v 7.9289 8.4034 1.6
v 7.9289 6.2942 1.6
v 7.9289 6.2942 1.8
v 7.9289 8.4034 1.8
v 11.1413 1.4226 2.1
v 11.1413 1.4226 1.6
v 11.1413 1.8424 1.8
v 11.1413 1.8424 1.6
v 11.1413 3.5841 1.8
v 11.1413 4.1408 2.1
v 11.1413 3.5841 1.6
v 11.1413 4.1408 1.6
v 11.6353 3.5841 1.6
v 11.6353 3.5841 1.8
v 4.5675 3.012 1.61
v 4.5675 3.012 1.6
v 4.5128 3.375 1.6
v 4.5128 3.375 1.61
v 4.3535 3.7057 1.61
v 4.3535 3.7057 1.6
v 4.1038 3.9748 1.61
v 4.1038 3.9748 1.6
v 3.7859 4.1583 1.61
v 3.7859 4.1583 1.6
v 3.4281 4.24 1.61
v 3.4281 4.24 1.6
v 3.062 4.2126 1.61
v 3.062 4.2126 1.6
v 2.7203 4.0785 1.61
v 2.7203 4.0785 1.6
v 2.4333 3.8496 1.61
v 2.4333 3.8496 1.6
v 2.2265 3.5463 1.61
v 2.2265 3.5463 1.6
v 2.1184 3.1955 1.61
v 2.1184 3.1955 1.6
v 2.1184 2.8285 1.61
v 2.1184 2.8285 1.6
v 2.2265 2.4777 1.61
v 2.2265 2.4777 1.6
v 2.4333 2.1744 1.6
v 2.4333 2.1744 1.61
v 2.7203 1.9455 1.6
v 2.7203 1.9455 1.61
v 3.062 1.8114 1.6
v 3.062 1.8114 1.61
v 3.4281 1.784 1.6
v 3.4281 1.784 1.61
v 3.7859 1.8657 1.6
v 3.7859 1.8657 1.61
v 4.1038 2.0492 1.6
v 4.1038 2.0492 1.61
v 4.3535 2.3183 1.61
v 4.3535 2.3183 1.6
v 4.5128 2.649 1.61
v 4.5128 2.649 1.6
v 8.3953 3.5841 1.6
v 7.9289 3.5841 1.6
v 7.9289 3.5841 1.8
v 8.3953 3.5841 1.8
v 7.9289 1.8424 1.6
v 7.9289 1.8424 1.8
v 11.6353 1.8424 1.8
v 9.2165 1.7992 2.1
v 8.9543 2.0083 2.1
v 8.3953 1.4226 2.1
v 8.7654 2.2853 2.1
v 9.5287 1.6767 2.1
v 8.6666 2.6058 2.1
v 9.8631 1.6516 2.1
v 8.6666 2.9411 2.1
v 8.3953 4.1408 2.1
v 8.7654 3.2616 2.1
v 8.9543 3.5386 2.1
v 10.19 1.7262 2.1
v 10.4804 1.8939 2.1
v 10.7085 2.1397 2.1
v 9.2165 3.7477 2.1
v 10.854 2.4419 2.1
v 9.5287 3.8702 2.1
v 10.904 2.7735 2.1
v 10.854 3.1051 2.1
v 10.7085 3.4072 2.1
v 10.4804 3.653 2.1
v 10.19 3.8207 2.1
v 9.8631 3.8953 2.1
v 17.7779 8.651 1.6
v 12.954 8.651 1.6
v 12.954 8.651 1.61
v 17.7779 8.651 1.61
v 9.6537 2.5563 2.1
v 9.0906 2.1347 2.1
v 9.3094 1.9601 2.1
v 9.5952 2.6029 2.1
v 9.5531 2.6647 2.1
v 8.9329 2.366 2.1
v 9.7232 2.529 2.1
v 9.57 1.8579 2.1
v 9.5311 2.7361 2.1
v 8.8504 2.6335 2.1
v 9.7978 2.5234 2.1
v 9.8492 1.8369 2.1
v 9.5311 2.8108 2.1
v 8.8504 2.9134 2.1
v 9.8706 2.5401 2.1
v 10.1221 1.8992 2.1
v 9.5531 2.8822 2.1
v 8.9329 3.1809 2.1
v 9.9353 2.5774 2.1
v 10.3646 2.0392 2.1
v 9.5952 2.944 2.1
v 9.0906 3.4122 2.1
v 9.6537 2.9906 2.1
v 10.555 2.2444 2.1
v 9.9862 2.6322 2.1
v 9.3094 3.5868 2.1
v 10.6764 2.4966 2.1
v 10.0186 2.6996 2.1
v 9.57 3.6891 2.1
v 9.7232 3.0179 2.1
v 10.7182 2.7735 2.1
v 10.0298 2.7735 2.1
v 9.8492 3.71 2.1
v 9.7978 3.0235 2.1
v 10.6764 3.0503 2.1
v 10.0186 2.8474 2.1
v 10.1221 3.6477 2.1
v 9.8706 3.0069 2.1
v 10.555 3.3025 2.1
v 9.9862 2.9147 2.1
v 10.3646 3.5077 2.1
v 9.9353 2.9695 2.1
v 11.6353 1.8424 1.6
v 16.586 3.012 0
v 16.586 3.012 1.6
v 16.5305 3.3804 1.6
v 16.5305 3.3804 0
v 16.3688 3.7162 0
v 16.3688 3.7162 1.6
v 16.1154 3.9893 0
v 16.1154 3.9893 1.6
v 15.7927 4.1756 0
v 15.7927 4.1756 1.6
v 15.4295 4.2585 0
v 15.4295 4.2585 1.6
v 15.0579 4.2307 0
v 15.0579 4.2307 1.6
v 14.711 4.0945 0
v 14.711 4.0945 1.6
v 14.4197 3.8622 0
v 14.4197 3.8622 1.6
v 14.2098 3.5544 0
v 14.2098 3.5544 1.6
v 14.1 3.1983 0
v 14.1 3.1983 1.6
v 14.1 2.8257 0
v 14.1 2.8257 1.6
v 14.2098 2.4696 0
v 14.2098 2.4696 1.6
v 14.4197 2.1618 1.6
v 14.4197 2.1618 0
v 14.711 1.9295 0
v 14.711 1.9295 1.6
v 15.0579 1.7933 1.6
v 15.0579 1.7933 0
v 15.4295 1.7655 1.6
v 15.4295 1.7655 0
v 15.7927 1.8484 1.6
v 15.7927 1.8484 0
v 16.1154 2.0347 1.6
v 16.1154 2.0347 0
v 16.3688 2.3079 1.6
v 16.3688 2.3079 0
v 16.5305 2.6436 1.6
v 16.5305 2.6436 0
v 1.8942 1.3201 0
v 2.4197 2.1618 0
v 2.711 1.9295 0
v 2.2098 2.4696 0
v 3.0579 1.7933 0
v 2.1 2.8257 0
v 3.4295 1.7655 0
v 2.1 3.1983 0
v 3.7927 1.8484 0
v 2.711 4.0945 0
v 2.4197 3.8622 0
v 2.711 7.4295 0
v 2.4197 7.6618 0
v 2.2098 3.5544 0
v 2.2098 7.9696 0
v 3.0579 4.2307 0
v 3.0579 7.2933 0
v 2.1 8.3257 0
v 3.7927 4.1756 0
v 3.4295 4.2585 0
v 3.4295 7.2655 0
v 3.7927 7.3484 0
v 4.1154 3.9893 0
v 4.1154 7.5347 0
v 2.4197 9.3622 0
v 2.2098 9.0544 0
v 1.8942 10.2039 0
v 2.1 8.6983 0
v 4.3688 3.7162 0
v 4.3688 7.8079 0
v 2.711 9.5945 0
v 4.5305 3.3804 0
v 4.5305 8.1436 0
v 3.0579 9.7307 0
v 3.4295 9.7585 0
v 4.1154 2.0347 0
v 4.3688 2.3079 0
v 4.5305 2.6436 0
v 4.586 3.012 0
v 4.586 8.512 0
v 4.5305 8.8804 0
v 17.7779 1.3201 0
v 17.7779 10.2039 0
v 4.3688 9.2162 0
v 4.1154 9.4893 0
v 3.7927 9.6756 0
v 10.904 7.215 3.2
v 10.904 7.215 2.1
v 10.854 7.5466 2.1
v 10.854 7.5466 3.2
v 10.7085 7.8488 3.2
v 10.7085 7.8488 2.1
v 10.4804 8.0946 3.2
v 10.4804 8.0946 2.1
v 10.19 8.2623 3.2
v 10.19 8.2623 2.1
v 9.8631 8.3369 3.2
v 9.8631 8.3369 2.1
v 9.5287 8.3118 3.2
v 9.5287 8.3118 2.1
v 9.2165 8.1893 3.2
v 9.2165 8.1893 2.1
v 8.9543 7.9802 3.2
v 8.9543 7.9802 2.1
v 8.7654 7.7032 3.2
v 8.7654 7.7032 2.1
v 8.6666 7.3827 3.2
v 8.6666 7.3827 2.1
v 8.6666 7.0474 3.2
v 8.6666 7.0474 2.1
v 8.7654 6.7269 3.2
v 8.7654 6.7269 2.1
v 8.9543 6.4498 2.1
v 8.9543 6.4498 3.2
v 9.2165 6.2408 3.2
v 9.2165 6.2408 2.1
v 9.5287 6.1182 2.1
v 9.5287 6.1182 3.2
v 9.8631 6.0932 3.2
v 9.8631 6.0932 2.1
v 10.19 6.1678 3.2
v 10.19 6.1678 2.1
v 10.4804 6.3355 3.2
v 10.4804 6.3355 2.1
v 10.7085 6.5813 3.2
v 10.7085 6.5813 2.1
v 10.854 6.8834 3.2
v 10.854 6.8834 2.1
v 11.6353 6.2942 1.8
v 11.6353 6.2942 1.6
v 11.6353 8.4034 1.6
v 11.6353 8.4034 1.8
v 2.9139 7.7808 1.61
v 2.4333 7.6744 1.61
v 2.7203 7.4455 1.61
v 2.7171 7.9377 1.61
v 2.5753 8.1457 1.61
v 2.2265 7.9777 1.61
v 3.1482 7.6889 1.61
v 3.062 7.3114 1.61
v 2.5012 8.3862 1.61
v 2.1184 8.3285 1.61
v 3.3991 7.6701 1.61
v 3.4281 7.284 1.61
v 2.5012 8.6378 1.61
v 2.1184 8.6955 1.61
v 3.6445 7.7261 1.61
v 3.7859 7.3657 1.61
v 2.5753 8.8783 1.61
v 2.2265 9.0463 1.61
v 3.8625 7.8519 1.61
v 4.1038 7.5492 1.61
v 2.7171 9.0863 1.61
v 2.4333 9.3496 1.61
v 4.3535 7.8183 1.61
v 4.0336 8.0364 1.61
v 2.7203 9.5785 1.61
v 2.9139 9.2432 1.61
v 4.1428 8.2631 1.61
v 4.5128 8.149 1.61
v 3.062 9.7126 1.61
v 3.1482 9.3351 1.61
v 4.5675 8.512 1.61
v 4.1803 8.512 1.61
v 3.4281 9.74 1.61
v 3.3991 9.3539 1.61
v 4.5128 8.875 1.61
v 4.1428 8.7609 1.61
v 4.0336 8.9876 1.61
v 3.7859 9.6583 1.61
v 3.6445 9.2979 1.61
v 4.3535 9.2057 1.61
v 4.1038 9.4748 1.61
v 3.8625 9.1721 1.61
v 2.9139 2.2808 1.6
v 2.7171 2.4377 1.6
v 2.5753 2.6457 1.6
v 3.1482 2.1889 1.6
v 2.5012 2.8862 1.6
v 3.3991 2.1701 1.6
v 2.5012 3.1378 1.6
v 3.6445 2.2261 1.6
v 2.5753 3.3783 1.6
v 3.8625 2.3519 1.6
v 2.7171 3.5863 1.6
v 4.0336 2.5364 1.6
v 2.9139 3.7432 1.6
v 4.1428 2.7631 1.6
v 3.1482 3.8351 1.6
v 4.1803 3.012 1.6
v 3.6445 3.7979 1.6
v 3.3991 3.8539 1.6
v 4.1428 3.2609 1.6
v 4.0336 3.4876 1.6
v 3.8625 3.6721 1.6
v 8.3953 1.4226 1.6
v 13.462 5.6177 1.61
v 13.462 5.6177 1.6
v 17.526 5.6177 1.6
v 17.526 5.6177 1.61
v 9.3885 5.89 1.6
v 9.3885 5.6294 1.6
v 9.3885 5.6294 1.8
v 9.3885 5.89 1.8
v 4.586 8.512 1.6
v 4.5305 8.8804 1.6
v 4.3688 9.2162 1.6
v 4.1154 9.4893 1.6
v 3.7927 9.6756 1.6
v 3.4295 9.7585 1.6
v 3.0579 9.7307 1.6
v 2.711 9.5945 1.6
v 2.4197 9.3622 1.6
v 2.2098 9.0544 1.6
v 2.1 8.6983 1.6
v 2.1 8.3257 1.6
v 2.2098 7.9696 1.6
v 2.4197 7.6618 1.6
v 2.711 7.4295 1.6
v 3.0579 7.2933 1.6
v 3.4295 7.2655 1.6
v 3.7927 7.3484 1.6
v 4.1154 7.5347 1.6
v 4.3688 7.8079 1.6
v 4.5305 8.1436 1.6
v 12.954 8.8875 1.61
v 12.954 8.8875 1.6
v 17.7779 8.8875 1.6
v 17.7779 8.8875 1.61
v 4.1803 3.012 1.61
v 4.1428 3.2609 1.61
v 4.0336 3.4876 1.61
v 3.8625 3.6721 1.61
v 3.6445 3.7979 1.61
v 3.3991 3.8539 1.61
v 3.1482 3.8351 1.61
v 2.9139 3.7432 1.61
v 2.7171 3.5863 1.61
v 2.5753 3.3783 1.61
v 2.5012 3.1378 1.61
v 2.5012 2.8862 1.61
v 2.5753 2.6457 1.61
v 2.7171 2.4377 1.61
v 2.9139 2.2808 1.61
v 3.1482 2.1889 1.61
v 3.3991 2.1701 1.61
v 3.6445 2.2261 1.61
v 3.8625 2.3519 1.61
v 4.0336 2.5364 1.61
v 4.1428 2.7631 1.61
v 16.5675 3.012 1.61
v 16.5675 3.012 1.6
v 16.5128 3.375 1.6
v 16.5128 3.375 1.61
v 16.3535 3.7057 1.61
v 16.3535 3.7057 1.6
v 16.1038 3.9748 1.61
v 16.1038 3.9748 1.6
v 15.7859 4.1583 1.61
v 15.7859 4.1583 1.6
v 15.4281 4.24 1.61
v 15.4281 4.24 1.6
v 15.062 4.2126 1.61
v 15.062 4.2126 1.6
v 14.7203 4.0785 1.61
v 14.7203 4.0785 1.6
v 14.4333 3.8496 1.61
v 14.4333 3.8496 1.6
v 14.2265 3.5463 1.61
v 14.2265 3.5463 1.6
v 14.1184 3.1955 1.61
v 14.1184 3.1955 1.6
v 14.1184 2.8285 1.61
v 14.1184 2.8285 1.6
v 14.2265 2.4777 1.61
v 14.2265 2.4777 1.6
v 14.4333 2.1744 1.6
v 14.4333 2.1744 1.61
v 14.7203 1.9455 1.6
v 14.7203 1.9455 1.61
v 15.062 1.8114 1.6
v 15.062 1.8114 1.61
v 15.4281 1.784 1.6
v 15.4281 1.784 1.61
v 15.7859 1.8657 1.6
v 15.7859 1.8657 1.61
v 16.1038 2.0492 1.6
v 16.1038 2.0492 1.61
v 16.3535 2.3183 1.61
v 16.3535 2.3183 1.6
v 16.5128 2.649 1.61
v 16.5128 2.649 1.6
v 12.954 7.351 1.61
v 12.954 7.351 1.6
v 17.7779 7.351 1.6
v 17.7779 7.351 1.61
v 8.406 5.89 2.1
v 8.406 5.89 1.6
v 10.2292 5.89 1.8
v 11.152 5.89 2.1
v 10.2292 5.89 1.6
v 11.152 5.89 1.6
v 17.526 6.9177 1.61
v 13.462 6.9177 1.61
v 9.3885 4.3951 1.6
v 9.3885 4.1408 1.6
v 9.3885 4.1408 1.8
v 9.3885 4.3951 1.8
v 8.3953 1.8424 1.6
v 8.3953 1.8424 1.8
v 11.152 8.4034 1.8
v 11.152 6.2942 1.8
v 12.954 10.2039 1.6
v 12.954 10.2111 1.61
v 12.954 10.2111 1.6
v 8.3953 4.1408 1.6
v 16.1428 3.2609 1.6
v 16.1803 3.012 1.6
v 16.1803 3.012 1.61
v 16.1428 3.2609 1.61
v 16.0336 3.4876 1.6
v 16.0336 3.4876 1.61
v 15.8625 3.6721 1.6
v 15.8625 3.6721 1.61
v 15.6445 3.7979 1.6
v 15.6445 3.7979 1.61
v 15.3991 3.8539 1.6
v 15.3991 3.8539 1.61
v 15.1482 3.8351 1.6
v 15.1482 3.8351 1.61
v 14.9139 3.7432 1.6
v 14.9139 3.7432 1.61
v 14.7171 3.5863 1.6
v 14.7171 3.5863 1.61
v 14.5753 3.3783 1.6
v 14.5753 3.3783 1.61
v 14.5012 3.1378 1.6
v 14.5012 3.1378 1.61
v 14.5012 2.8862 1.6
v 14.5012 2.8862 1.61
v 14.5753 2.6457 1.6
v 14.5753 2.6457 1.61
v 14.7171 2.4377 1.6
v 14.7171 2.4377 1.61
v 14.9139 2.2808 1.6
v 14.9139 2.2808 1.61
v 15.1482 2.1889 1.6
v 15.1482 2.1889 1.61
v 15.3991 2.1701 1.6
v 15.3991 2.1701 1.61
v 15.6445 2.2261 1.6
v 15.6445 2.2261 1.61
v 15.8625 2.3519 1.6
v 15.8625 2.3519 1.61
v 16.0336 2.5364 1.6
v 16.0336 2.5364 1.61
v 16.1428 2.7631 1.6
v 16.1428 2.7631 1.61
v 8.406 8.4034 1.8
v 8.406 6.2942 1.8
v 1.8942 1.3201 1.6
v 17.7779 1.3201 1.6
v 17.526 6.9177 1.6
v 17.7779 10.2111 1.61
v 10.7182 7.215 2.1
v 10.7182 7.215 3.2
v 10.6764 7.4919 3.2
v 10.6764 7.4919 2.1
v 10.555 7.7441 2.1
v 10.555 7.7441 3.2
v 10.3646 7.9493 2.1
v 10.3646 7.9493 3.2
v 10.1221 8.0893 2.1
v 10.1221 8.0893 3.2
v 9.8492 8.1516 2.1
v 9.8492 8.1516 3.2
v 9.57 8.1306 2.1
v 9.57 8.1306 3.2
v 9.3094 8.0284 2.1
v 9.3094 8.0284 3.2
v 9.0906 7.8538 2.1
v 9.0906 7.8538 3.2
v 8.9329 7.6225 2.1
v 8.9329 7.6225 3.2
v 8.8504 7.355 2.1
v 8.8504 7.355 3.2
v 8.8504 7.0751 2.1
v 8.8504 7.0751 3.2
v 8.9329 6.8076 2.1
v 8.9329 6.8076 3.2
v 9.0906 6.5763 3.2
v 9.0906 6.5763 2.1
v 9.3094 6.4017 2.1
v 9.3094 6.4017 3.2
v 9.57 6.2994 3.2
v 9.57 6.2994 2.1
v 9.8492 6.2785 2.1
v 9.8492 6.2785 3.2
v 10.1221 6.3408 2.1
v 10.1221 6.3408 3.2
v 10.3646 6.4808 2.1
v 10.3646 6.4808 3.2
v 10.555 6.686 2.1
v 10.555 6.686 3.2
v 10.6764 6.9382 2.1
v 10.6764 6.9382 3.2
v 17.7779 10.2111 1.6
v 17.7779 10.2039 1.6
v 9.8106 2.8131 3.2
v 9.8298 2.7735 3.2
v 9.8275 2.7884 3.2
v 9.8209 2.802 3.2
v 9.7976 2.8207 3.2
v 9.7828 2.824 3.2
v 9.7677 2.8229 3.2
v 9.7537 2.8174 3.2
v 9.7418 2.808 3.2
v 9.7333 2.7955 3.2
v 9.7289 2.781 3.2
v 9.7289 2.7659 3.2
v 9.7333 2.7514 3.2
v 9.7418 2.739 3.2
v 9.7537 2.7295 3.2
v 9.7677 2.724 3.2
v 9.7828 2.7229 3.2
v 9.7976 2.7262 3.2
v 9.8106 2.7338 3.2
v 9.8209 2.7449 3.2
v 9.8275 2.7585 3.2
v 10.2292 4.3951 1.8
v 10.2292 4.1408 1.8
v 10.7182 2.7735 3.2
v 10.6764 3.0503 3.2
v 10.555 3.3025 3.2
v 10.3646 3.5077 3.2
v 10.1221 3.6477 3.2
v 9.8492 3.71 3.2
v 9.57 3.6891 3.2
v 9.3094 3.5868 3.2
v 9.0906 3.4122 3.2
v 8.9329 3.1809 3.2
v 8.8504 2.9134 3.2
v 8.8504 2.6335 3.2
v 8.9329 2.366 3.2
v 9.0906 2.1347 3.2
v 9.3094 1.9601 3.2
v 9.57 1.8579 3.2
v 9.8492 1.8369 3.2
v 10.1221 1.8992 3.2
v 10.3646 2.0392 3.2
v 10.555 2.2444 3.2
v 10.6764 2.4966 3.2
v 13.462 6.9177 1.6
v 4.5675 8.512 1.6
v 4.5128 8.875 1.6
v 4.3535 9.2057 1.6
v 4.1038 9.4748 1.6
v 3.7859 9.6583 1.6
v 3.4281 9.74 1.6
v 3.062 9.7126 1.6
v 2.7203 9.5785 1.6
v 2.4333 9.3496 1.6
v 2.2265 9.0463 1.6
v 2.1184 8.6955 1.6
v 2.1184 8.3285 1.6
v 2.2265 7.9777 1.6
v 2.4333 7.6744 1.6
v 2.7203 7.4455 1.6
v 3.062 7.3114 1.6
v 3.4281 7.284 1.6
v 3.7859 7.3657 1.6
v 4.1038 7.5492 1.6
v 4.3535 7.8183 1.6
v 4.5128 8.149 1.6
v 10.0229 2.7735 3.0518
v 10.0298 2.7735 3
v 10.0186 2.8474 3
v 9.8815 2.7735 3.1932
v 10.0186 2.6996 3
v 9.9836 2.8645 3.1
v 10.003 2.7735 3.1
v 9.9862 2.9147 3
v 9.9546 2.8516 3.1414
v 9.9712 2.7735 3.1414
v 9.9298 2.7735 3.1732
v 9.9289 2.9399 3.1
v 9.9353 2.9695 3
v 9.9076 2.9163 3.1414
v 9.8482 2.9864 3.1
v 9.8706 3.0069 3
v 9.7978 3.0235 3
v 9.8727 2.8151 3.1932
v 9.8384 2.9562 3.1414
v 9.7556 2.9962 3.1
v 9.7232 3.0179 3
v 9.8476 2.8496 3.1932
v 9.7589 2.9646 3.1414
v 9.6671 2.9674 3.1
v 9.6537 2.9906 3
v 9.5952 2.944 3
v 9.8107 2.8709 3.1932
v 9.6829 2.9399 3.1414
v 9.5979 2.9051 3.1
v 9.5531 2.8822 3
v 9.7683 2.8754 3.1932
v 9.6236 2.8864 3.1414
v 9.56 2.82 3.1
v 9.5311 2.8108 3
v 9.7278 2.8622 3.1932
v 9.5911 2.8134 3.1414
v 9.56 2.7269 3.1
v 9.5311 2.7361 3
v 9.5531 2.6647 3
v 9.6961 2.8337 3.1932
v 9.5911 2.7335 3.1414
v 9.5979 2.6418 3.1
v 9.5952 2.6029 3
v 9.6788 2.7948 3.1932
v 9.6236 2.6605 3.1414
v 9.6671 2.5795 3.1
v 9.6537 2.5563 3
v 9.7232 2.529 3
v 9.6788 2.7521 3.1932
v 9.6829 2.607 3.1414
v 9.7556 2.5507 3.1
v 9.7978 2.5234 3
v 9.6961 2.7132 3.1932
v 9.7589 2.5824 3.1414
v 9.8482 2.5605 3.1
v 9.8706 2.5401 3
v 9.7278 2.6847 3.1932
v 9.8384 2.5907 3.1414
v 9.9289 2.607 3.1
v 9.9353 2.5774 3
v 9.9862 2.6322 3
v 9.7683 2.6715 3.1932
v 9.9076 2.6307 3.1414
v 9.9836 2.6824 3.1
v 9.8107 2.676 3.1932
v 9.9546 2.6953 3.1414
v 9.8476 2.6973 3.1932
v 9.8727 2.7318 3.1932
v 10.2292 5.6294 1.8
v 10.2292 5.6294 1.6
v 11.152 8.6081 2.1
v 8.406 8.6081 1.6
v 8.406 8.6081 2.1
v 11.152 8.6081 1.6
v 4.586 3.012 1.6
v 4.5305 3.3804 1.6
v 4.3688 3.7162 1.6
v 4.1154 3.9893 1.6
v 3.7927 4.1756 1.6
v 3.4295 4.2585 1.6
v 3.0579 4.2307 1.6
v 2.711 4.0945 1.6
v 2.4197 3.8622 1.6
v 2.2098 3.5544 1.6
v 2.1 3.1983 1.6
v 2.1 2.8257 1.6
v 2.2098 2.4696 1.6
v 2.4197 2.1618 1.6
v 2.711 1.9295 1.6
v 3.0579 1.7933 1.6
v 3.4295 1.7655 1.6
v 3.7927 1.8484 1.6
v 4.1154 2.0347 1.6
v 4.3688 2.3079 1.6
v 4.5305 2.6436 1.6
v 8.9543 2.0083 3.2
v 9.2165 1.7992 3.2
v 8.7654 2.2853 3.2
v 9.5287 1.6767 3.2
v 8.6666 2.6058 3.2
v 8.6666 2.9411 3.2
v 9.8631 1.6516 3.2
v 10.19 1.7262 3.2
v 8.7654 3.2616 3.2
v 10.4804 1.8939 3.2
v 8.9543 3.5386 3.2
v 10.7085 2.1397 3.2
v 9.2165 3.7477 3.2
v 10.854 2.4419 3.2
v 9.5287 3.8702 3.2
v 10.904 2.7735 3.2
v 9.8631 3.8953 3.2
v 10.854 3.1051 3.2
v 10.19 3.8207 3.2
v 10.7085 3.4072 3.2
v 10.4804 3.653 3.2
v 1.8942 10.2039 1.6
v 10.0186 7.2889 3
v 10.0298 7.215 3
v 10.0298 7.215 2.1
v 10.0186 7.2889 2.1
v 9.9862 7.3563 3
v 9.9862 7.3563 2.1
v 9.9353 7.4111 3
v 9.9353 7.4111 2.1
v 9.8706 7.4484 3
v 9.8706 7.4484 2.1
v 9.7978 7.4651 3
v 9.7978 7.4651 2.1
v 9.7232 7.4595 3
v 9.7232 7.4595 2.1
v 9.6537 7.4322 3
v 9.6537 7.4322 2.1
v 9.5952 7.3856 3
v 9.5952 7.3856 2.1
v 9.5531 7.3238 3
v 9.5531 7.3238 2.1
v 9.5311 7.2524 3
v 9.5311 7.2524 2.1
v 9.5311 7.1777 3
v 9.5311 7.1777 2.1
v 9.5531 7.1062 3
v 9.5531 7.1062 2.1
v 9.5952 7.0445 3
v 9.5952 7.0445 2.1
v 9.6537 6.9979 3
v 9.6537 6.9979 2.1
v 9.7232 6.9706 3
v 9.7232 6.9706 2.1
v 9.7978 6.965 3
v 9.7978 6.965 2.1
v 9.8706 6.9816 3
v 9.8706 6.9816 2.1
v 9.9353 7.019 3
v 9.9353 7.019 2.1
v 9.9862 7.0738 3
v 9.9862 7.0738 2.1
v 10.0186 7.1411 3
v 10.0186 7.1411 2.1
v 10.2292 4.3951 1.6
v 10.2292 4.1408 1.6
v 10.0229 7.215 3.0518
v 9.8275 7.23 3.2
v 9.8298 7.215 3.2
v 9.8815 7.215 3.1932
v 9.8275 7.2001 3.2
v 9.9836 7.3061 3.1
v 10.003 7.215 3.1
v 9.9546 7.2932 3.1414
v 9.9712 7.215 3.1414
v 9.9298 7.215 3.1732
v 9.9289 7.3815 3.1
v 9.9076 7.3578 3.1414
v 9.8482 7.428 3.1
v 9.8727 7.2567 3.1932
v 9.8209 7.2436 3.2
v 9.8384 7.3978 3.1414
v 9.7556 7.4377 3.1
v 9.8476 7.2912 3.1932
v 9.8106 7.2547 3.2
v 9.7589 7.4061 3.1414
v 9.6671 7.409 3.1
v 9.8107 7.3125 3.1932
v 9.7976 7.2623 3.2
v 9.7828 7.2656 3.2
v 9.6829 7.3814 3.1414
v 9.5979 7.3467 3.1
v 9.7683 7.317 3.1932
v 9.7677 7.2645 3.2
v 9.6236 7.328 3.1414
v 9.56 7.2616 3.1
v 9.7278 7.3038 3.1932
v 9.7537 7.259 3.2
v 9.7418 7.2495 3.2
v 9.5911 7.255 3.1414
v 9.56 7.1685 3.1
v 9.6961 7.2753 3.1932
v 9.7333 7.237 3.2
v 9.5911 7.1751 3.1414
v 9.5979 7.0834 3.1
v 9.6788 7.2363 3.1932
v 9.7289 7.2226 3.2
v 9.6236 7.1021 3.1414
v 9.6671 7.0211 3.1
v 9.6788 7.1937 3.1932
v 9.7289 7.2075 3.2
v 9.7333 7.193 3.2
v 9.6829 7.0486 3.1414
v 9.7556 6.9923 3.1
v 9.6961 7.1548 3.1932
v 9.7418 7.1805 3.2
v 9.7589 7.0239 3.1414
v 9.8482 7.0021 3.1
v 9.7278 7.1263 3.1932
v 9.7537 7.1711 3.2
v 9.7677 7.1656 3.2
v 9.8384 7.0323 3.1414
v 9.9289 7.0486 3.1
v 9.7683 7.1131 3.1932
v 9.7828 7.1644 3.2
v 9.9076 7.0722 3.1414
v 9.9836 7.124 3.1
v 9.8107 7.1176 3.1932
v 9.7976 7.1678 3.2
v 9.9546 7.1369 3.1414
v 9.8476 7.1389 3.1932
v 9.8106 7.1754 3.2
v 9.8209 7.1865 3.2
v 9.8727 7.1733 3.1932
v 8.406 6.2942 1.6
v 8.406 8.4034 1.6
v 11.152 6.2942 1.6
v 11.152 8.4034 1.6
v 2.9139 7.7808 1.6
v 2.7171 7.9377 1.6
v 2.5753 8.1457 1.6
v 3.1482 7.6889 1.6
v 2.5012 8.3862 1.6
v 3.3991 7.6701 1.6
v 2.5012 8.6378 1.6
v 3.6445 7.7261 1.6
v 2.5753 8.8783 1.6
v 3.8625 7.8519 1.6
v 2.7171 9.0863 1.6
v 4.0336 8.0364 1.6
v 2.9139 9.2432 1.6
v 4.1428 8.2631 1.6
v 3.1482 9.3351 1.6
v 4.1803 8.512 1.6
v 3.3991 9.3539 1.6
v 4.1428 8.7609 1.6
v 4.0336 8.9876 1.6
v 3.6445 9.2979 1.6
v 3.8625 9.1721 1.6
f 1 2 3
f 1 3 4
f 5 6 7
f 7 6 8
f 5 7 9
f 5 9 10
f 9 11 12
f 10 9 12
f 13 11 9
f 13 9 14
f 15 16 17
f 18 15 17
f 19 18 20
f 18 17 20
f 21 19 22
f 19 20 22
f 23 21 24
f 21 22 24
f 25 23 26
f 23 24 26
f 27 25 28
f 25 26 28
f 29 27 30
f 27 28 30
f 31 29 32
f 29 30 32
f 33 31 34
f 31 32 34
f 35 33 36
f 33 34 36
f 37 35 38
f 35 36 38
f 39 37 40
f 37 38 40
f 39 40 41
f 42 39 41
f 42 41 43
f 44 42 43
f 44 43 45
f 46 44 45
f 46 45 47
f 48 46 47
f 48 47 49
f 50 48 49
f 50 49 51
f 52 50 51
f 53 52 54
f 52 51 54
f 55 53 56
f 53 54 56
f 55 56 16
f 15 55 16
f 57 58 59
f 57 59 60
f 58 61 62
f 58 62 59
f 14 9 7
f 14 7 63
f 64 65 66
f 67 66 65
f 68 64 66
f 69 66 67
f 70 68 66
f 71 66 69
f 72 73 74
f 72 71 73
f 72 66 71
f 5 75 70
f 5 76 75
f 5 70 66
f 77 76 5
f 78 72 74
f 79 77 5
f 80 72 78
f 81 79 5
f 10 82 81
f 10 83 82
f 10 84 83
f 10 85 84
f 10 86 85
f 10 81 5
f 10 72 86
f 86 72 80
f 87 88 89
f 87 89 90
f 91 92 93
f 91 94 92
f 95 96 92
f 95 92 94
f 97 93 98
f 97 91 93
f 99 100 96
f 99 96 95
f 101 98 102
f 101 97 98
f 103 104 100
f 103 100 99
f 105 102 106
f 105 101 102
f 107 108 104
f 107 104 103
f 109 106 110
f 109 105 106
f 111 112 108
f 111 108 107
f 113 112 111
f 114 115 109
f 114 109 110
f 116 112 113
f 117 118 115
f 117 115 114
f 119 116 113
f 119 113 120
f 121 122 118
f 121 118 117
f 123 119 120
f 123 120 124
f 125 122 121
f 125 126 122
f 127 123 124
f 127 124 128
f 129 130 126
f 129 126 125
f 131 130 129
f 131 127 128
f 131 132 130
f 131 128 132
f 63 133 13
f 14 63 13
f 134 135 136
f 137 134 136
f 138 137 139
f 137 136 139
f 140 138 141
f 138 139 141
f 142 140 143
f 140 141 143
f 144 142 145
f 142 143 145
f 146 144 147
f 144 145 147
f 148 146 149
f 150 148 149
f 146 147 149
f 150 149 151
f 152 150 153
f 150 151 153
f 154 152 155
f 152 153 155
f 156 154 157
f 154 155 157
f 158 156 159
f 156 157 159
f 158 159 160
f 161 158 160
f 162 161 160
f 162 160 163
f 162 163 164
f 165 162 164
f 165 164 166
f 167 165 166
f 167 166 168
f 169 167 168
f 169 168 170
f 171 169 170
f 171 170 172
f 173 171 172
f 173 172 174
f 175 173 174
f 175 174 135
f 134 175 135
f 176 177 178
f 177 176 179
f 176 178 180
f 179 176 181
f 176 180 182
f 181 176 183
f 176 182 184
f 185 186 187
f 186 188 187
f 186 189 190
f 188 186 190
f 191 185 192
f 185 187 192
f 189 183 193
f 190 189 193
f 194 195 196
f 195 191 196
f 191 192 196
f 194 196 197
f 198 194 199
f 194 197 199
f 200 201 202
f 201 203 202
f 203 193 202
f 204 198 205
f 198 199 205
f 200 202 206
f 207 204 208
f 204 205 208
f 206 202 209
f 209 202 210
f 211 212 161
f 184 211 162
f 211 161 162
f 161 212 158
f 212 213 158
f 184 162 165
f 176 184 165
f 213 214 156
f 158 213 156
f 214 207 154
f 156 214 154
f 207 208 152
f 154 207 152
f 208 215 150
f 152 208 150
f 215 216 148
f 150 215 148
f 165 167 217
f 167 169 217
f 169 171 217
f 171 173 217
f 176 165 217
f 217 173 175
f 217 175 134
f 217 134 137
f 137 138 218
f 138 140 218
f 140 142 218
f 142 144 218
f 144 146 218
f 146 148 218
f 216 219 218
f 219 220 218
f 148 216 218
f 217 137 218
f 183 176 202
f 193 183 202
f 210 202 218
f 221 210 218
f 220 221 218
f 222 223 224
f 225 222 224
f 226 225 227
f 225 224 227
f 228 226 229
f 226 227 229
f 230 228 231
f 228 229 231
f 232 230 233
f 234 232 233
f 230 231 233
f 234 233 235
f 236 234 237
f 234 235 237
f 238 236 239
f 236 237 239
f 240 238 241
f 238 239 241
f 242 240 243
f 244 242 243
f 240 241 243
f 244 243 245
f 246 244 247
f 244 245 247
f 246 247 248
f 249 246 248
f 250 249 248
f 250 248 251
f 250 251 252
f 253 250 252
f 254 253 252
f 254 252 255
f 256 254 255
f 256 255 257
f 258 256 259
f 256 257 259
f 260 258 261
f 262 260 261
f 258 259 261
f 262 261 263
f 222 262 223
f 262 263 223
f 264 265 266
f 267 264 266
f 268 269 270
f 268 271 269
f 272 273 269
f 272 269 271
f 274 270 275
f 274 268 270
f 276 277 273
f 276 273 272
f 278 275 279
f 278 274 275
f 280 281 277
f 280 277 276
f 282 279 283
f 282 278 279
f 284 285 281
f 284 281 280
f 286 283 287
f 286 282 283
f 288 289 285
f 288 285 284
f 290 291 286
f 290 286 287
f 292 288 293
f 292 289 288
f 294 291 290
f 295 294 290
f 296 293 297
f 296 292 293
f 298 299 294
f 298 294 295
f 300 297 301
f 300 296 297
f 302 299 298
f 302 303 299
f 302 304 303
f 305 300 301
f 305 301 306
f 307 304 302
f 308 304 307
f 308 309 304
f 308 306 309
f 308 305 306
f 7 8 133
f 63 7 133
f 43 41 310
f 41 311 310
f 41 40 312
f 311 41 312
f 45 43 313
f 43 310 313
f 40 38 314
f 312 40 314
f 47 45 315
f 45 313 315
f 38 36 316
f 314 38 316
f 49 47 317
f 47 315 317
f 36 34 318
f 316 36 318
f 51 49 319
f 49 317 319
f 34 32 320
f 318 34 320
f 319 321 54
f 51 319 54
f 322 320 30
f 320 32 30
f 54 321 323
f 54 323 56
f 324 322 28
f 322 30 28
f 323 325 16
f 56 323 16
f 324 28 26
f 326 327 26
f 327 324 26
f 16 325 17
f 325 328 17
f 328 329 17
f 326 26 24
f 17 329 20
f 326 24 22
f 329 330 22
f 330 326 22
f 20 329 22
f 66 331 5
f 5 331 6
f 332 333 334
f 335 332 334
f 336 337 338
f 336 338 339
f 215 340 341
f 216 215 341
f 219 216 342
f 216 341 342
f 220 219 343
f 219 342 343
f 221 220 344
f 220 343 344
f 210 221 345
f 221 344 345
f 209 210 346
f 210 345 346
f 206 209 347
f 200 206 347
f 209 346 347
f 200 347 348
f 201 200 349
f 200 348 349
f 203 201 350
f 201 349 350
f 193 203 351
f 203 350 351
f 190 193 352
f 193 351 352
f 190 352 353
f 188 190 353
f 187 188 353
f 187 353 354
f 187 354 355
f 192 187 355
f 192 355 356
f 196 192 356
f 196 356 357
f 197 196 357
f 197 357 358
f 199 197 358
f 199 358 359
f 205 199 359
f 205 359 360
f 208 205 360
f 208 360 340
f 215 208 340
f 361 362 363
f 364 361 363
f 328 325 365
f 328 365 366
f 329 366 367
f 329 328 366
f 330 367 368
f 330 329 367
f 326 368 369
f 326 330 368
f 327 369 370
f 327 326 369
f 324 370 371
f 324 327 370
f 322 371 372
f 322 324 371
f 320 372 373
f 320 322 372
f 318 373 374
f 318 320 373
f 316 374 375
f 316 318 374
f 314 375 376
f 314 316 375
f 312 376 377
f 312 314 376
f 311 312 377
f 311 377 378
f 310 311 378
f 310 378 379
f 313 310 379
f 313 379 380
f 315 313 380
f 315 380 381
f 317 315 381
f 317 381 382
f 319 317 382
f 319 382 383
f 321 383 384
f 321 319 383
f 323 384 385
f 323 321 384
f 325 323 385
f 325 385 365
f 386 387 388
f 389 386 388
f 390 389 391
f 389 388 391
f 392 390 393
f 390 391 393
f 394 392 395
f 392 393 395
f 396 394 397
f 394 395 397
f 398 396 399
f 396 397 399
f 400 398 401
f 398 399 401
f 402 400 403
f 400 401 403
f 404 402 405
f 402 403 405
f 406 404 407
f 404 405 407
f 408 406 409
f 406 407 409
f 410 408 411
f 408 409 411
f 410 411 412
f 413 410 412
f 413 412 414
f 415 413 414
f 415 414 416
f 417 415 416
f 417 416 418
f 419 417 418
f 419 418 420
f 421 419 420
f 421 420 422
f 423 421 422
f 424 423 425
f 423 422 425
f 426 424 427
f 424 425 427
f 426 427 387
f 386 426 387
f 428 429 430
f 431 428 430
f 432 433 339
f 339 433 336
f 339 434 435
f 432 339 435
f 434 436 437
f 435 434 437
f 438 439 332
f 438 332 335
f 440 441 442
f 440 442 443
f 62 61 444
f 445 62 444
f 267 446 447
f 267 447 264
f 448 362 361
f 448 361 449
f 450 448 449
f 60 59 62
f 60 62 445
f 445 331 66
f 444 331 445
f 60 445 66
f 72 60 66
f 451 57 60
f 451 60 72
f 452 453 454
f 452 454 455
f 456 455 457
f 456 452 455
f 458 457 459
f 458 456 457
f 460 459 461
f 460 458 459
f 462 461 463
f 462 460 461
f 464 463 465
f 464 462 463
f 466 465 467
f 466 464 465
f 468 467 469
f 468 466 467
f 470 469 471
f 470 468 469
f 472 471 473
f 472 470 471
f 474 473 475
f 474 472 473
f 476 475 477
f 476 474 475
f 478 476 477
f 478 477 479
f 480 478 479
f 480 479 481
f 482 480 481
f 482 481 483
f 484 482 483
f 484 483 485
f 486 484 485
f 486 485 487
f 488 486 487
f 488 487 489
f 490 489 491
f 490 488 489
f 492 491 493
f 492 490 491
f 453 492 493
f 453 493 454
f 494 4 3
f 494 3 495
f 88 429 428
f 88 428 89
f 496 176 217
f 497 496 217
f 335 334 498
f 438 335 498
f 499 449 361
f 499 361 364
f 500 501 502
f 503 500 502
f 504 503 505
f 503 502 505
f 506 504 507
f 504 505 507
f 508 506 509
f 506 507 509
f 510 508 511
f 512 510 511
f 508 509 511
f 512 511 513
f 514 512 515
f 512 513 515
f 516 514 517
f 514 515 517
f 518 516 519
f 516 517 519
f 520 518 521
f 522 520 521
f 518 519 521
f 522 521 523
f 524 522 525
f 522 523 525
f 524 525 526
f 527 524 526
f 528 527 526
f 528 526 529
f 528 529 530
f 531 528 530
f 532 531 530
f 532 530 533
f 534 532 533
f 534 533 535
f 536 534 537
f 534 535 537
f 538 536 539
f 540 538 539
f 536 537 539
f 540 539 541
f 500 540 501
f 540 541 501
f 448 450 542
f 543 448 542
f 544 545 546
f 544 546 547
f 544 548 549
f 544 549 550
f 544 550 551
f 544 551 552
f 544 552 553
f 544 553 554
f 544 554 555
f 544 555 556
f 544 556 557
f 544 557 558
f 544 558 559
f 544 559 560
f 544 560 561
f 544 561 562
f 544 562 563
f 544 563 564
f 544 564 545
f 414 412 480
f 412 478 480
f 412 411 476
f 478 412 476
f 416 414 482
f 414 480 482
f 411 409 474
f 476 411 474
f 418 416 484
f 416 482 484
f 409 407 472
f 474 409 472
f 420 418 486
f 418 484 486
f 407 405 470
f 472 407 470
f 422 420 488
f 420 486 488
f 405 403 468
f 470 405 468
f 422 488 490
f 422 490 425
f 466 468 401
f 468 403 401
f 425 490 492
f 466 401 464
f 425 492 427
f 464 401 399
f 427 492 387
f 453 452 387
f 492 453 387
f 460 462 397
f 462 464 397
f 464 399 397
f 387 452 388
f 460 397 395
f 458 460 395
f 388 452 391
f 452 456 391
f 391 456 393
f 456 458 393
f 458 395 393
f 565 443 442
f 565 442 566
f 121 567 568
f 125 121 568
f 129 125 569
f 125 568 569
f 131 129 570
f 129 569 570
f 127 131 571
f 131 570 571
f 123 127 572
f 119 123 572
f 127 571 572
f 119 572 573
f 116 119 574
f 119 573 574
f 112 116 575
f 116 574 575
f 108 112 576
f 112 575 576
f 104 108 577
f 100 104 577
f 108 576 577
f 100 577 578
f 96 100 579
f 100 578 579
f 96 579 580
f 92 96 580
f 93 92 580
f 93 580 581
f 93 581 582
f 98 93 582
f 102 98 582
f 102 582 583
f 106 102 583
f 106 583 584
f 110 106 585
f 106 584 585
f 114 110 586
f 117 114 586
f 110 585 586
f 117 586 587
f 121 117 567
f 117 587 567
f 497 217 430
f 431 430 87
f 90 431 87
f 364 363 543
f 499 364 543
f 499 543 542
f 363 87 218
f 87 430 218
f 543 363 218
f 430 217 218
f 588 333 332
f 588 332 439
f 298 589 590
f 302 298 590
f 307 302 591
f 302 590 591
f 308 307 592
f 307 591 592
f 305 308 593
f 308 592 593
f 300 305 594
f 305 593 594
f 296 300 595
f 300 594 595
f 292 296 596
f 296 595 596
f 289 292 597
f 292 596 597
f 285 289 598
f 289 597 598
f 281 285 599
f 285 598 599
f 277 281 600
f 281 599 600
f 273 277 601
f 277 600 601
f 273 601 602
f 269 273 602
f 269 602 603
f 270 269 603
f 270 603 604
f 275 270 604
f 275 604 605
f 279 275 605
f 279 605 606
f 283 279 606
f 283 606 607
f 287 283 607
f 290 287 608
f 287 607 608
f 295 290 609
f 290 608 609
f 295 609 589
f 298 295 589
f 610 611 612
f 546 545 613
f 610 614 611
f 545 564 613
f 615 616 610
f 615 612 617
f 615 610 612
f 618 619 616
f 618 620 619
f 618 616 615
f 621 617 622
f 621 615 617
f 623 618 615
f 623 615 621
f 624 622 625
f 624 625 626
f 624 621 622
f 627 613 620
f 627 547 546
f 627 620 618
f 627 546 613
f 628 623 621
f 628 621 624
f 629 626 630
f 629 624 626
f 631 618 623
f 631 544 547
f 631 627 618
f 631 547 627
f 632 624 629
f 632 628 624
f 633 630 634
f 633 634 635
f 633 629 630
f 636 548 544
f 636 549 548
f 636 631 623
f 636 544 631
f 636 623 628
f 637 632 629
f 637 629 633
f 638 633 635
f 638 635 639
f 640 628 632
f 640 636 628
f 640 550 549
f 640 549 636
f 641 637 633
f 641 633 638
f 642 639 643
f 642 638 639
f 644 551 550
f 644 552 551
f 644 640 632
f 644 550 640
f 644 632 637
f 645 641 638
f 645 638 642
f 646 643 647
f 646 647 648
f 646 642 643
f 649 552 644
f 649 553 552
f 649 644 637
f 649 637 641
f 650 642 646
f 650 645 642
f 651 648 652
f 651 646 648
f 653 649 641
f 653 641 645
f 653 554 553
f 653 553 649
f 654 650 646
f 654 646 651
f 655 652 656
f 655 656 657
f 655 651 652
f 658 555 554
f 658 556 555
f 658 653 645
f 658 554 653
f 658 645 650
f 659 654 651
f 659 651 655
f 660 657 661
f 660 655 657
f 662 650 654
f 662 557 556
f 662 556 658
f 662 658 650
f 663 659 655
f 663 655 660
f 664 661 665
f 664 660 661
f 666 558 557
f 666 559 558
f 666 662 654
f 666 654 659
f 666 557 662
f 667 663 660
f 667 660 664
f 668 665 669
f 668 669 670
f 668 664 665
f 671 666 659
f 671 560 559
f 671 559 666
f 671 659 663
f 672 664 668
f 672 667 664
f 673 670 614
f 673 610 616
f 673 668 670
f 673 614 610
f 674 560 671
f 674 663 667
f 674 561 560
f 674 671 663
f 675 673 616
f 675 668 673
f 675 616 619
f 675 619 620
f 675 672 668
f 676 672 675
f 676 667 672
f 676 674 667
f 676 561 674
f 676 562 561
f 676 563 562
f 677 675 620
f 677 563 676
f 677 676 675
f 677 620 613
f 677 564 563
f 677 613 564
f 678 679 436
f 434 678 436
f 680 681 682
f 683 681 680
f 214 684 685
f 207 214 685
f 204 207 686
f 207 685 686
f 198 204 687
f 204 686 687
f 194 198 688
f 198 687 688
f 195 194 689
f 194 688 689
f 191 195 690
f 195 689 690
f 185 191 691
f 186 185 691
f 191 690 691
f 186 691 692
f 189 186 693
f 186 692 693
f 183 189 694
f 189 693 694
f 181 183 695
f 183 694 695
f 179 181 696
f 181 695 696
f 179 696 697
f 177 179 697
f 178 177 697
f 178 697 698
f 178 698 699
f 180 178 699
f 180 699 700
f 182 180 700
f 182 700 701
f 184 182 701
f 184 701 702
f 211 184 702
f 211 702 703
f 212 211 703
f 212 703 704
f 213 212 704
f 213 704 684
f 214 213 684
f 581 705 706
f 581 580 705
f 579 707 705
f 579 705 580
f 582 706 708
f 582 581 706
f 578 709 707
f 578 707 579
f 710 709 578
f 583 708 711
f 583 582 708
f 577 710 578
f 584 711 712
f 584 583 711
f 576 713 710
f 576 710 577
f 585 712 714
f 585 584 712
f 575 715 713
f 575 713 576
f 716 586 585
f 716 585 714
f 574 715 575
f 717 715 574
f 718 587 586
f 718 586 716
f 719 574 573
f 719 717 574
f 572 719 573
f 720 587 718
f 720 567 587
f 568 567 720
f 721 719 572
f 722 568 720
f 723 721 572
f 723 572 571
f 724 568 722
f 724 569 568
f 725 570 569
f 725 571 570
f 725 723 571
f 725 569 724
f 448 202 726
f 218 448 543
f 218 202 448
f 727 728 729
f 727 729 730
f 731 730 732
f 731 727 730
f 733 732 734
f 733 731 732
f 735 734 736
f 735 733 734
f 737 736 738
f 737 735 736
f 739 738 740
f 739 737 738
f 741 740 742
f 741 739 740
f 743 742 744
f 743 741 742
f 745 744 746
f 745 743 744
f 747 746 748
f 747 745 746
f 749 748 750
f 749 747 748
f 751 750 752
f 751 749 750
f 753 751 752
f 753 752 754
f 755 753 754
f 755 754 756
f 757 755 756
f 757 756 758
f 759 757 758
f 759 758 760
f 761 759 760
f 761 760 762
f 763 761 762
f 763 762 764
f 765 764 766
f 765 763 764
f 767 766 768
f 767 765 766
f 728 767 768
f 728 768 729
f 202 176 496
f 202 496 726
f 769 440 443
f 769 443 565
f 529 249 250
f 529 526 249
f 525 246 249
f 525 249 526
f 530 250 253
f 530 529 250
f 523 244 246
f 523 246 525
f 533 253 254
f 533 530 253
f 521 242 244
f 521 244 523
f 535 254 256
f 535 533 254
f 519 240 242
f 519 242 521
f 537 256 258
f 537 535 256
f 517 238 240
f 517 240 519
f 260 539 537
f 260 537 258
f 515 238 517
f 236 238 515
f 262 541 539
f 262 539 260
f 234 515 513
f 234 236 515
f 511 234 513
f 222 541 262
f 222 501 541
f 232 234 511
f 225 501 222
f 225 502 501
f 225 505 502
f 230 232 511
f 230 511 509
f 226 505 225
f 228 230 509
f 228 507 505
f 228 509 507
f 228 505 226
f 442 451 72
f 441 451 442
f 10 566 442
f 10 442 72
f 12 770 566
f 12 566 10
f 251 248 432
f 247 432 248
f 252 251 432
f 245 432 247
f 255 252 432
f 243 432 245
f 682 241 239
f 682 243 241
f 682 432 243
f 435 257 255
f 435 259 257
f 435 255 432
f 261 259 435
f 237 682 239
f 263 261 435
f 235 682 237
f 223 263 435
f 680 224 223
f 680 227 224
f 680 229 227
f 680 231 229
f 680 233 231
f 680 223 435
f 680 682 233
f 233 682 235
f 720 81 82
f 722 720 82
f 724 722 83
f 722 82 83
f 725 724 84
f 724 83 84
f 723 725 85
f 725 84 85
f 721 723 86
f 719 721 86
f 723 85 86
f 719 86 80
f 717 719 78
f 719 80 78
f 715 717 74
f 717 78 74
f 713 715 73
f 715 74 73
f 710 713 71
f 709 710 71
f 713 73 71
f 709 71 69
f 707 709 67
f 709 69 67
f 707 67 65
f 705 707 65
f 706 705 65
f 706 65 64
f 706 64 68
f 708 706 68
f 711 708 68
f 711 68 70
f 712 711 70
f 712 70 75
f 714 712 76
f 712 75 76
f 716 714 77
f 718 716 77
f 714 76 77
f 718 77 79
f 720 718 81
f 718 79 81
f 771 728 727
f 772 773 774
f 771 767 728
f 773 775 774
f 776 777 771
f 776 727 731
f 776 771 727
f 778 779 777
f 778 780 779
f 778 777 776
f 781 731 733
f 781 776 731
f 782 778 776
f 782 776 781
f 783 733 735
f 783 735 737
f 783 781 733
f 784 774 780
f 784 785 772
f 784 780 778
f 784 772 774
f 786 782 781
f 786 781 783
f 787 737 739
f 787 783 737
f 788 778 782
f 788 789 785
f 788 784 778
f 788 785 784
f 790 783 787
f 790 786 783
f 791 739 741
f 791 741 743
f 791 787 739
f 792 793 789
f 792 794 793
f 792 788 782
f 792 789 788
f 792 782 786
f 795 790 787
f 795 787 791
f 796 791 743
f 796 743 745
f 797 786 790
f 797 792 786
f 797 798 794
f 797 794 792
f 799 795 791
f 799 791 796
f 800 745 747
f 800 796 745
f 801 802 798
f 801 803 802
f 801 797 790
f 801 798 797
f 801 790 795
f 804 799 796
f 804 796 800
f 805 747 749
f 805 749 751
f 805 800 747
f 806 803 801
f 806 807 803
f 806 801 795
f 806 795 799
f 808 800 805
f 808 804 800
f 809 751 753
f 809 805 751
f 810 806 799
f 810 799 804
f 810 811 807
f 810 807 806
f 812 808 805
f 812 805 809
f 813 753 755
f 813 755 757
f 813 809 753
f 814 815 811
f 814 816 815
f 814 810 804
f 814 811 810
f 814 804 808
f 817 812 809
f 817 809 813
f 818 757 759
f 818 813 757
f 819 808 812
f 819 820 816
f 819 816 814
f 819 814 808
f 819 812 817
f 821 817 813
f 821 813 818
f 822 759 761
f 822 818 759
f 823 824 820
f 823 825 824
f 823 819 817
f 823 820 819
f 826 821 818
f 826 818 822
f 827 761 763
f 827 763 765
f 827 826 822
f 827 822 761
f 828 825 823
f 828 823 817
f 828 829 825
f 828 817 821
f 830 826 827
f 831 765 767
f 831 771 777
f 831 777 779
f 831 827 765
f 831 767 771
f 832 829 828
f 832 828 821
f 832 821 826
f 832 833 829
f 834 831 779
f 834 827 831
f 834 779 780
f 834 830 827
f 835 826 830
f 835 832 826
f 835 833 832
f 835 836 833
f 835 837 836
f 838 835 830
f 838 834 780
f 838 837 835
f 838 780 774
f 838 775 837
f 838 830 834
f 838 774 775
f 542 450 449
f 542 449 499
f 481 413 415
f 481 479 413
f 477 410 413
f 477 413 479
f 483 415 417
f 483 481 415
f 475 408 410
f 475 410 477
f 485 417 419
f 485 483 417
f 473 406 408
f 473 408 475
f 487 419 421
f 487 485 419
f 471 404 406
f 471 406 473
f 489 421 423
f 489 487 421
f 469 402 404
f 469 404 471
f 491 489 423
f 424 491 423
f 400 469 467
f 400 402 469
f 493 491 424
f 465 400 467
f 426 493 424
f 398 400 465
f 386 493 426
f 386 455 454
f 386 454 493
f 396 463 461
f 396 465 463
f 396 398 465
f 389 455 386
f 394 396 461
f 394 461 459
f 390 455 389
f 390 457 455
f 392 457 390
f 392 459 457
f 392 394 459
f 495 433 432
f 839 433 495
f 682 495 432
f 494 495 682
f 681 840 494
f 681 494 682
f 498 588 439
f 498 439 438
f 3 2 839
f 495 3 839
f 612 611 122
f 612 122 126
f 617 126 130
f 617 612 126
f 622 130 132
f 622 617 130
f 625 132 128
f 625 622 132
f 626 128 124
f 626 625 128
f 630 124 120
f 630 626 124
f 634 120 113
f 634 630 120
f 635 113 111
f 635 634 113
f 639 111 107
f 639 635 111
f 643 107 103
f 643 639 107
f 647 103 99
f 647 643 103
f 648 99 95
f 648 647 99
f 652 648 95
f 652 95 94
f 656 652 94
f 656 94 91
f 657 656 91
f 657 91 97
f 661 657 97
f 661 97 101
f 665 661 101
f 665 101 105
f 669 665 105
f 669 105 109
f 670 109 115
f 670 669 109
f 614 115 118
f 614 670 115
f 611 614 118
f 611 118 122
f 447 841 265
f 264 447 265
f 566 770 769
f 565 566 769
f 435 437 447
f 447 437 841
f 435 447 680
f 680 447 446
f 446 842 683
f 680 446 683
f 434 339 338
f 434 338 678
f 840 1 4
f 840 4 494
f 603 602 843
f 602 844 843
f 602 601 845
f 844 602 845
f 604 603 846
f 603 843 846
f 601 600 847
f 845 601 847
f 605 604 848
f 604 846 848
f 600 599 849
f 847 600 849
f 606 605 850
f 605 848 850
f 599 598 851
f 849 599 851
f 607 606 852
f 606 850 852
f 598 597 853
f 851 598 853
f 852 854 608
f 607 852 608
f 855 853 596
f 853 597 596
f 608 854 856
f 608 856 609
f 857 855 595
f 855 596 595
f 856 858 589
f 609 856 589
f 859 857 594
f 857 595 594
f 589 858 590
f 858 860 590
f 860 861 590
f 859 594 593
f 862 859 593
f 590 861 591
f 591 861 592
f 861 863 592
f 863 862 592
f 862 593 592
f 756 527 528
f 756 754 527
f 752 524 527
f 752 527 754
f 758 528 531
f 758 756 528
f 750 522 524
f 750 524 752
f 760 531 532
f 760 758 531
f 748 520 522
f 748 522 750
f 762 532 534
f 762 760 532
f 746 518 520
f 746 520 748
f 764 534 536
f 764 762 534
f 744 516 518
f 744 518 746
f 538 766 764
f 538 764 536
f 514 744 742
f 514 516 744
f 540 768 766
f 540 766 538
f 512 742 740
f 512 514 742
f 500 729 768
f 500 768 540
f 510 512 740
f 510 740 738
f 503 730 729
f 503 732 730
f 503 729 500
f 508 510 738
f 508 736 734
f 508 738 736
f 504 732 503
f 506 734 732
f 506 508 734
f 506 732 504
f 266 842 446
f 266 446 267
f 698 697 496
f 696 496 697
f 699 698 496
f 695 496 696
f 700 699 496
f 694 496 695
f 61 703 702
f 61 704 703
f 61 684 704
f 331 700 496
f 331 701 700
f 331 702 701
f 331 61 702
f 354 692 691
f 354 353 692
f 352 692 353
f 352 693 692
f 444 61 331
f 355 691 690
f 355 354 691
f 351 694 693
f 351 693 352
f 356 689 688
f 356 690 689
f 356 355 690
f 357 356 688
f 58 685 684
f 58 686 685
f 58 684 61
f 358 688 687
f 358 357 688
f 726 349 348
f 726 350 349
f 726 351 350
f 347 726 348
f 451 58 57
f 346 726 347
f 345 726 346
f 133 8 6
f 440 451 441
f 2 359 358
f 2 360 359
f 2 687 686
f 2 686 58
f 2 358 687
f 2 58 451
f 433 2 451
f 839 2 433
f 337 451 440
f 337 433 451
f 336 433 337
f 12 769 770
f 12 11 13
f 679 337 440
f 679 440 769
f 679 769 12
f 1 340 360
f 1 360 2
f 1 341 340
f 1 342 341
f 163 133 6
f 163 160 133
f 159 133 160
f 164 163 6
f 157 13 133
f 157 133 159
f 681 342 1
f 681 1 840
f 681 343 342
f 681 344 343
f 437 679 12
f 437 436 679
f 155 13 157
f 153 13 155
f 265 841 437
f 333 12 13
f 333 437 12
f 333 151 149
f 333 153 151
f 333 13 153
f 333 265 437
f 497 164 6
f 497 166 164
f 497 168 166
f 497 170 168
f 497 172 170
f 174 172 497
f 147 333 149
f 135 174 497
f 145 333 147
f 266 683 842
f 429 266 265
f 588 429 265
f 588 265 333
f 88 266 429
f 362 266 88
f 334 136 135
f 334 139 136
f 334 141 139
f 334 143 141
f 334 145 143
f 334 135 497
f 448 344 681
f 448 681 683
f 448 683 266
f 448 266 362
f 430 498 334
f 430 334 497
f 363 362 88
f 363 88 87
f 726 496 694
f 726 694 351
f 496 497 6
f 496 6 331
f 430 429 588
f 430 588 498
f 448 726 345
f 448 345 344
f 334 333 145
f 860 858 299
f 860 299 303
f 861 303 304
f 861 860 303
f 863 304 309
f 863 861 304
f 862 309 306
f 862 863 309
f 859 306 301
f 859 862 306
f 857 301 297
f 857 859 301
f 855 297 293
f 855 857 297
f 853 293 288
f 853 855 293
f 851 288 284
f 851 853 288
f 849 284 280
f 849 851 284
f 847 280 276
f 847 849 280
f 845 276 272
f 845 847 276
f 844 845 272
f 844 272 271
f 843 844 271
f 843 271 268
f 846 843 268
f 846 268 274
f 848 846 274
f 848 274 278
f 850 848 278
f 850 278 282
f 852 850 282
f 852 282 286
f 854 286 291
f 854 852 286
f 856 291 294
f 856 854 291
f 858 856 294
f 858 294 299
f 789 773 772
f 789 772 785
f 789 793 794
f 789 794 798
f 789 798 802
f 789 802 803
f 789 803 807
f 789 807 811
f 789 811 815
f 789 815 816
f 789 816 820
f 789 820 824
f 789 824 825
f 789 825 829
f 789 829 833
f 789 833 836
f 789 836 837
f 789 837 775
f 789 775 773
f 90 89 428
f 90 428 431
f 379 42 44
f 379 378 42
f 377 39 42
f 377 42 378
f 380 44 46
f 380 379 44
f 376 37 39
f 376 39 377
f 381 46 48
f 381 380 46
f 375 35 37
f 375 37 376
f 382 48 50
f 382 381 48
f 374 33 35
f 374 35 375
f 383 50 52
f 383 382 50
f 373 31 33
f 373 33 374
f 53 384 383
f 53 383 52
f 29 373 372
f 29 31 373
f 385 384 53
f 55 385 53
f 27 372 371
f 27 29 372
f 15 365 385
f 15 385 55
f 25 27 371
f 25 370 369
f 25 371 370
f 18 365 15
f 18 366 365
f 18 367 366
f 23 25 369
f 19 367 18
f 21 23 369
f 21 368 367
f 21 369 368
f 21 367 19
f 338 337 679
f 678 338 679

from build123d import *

# Parameters (mm, degrees)
SKETCH_2_W          = 15.883718568
SKETCH_2_H          = 8.883718568
EXTRUDE_1_DEPTH     = 1.6
SKETCH_3_R          = 1.25
CUT_EXTRUDE_1_DEPTH = 2.6
SKETCH_4_W          = 2.745999492
SKETCH_4_H          = 2.718161036
EXTRUDE_2_DEPTH     = 0.5
SKETCH_5_R          = 1.12499557
EXTRUDE_3_DEPTH     = 1.1
SKETCH_6_R          = 0.939144678
SKETCH_6_R_2        = 0.250730718
CUT_EXTRUDE_2_DEPTH = 1.1
SKETCH_7_W          = 4.823876048
SKETCH_7_H          = 1.323618812
SKETCH_7_H_2        = 1.30000254
SKETCH_7_W_2        = 4.064007974
SKETCH_7_H_3        = 1.300002495
EXTRUDE_4_DEPTH     = 0.01
SKETCH_8_R          = 1.23144493
SKETCH_8_R_2        = 0.844305723
EXTRUDE_5_DEPTH     = 0.01
EXTRUDE_5_2_DEPTH   = 0.01
EXTRUDE_5_3_DEPTH   = 0.01
SKETCH_10_W         = 0.477139809
SKETCH_10_H         = 2.109219038
SKETCH_10_W_2       = 0.48327821
SKETCH_10_W_3       = 0.840630776
SKETCH_10_H_2       = 0.260609051
SKETCH_10_W_4       = 0.466430951
SKETCH_10_H_3       = 1.741760788
SKETCH_10_W_5       = 0.493987068
SKETCH_10_H_4       = 0.254356202
EXTRUDE_6_DEPTH     = 0.2
FILLET_1_R          = 0.2


with BuildPart() as part:
    # 草图2 → 凸台-拉伸1 (new body)
    with BuildSketch(Plane.XY):
        with Locations((9.836042672, 5.762001524)):
            Rectangle(SKETCH_2_W, SKETCH_2_H)
    extrude(amount=EXTRUDE_1_DEPTH)

    # 草图3 → 切除-拉伸1 (cut, through all)
    with BuildSketch(Plane.XY.offset(1.6)):
        with Locations((3.336042672, 8.512001524)):
            Circle(SKETCH_3_R)
        with Locations((15.336042672, 3.012001525)):
            Circle(SKETCH_3_R)
        with Locations((3.336042672, 3.012001524)):
            Circle(SKETCH_3_R)
    extrude(amount=-CUT_EXTRUDE_1_DEPTH, mode=Mode.SUBTRACT)

    # 草图4 → 凸台-拉伸2 (add)
    with BuildSketch(Plane.XY.offset(1.6)):
        with Locations((9.7683107, 2.781701931)):
            Rectangle(SKETCH_4_W, SKETCH_4_H)
        with Locations((9.779019558, 7.249047498)):
            Rectangle(SKETCH_4_W, SKETCH_4_H)
    extrude(amount=EXTRUDE_2_DEPTH)

    # 草图5 → 凸台-拉伸3 (add)
    with BuildSketch(Plane.XY.offset(2.1)):
        with Locations((9.779019558, 7.215035087)):
            Circle(SKETCH_5_R)
        with Locations((9.779019558, 2.773456295)):
            Circle(SKETCH_5_R)
    extrude(amount=EXTRUDE_3_DEPTH)

    # 草图6 → 切除-拉伸2 (cut)
    with BuildSketch(Plane.XY.offset(3.2)):
        with Locations((9.779019558, 7.215035087)):
            Circle(SKETCH_6_R)
        with Locations((9.779019558, 7.215035087)):
            Circle(SKETCH_6_R_2, mode=Mode.SUBTRACT)
        with Locations((9.779019558, 2.773456295)):
            Circle(SKETCH_6_R)
        with Locations((9.779019558, 2.773456295)):
            Circle(SKETCH_6_R_2, mode=Mode.SUBTRACT)
    extrude(amount=-CUT_EXTRUDE_2_DEPTH, mode=Mode.SUBTRACT)

    # 草图7 → 凸台-拉伸4 (add)
    with BuildSketch(Plane.XY.offset(1.6)):
        with Locations((15.365963932, 9.549287181)):
            Rectangle(SKETCH_7_W, SKETCH_7_H)
        with Locations((15.365963932, 8.001017272)):
            Rectangle(SKETCH_7_W, SKETCH_7_H_2)
        with Locations((15.494031065, 6.267661948)):
            Rectangle(SKETCH_7_W_2, SKETCH_7_H_3)
    extrude(amount=EXTRUDE_4_DEPTH)

    # 草图10 → 凸台-拉伸6 (add)
    with BuildSketch(Plane.XY.offset(1.6)):
        with Locations((8.167449907, 7.34882997)):
            Rectangle(SKETCH_10_W, SKETCH_10_H)
        with Locations((11.393658409, 7.34882997)):
            Rectangle(SKETCH_10_W_2, SKETCH_10_H)
        with Locations((9.808836101, 5.759662455)):
            Rectangle(SKETCH_10_W_3, SKETCH_10_H_2)
        with Locations((8.162095479, 2.713251358)):
            Rectangle(SKETCH_10_W_4, SKETCH_10_H_3)
        with Locations((11.38830398, 2.713251358)):
            Rectangle(SKETCH_10_W_5, SKETCH_10_H_3)
        with Locations((9.808836101, 4.26796055)):
            Rectangle(SKETCH_10_W_3, SKETCH_10_H_4)
    extrude(amount=EXTRUDE_6_DEPTH)

    # 圆角1
    fillet_1_edges = [part.edges().sort_by_distance(p)[0] for p in [
        (9.52828884, 7.215035087, 3.2),
        (9.52828884, 2.773456295, 3.2),
    ]]
    fillet(fillet_1_edges, radius=FILLET_1_R)


with BuildPart() as body_2:
    # 草图8 → 凸台-拉伸5 (new body)
    with BuildSketch(Plane.XY.offset(1.6)):
        with Locations((3.336042672, 8.512001524)):
            Circle(SKETCH_8_R)
        with Locations((3.336042672, 8.512001524)):
            Circle(SKETCH_8_R_2, mode=Mode.SUBTRACT)
    extrude(amount=EXTRUDE_5_DEPTH)


with BuildPart() as body_3:
    # 草图8 → Extrude 5 2 (new body)
    with BuildSketch(Plane.XY.offset(1.6)):
        with Locations((3.336042672, 3.012001524)):
            Circle(SKETCH_8_R)
        with Locations((3.336042672, 3.012001524)):
            Circle(SKETCH_8_R_2, mode=Mode.SUBTRACT)
    extrude(amount=EXTRUDE_5_2_DEPTH)


with BuildPart() as body_4:
    # 草图8 → Extrude 5 3 (new body)
    with BuildSketch(Plane.XY.offset(1.6)):
        with Locations((15.336042672, 3.012001525)):
            Circle(SKETCH_8_R)
        with Locations((15.336042672, 3.012001525)):
            Circle(SKETCH_8_R_2, mode=Mode.SUBTRACT)
    extrude(amount=EXTRUDE_5_3_DEPTH)


solid = Compound([part.part, body_2.part, body_3.part, body_4.part])
